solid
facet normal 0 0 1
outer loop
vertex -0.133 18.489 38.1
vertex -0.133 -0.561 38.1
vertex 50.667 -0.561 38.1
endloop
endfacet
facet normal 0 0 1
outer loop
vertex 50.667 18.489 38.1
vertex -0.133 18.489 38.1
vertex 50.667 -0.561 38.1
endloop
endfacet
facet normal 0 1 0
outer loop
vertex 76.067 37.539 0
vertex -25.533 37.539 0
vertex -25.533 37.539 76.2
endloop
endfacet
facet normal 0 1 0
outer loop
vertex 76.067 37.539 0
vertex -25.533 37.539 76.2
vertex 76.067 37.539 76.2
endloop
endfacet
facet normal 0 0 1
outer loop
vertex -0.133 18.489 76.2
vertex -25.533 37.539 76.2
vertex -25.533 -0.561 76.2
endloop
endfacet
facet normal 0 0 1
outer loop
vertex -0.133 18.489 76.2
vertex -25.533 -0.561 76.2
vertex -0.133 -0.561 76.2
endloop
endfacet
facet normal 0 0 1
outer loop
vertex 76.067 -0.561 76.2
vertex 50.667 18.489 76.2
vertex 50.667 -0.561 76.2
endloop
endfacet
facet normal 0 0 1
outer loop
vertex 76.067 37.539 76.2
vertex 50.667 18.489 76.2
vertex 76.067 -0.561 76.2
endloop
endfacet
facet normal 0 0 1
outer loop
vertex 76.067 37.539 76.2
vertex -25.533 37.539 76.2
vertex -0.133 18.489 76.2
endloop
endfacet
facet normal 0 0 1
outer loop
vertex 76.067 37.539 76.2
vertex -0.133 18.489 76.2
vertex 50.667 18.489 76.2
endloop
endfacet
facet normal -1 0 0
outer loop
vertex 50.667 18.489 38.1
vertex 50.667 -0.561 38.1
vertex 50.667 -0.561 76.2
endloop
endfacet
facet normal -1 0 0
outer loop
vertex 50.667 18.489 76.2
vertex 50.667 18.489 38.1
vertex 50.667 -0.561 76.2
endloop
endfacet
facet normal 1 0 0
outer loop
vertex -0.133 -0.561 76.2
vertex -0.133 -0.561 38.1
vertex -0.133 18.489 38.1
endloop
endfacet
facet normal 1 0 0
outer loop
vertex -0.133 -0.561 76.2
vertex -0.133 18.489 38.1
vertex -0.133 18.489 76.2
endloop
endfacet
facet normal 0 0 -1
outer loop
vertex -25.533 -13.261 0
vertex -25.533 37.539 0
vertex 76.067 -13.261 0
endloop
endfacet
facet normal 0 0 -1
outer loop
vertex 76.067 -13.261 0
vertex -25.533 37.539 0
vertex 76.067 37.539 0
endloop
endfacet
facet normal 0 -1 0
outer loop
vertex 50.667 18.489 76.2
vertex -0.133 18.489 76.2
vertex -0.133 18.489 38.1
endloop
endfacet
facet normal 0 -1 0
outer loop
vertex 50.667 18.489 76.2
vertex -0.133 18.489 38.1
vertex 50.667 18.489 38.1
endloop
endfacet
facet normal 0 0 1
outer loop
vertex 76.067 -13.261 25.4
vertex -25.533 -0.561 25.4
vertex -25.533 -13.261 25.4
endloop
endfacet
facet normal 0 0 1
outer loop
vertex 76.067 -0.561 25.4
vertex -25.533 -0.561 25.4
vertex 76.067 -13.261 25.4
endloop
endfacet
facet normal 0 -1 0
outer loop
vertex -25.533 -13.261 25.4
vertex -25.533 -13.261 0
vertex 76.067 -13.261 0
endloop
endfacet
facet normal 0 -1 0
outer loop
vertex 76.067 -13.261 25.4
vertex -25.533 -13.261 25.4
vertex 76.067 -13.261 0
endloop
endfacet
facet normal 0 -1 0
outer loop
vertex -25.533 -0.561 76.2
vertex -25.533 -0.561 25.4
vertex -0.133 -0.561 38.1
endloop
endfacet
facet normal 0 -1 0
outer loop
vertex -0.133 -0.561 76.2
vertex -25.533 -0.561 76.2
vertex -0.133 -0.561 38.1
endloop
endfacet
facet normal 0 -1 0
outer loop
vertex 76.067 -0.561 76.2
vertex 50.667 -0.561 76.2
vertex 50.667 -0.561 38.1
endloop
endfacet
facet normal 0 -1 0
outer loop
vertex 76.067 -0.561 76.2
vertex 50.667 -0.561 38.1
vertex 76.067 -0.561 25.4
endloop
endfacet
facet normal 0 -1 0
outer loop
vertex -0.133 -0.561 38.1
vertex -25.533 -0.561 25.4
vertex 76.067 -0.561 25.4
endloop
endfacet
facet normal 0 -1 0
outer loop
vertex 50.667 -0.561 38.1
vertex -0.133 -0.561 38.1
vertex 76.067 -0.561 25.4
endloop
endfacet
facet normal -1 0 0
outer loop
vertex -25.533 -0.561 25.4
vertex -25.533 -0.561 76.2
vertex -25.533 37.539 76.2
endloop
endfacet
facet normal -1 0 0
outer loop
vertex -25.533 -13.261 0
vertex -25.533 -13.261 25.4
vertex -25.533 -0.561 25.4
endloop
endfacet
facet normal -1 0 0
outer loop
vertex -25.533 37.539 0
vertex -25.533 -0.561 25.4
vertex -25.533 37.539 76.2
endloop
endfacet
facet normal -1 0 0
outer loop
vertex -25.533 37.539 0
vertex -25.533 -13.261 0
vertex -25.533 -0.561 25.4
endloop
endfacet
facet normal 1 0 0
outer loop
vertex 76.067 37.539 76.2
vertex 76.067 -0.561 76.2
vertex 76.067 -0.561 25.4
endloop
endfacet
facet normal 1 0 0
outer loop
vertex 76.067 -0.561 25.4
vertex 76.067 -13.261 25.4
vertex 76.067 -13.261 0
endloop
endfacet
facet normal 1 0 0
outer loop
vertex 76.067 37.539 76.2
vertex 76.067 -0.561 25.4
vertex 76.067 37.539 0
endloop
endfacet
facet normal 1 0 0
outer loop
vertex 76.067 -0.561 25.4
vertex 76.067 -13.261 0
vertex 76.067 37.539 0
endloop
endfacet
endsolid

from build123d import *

# Parameters (mm, degrees)
F0_W     = 101.6
F0_H     = 50.8
F1_DEPTH = 25.4
F2_W     = 101.6
F2_H     = 38.1
F3_DEPTH = 50.8
F4_W     = 50.8
F4_H     = 38.1
F5_DEPTH = 19.05


with BuildPart() as f1:
    # F0 (on Top) → F1 (new body)
    with BuildSketch(Plane.XY):
        with Locations((25.266851, 12.138548)):
            Rectangle(F0_W, F0_H)
    extrude(amount=F1_DEPTH)

    # F2 (on face) → F3 (join)
    with BuildSketch(Plane.XY.offset(25.4)):
        with Locations((25.266851, 18.488548)):
            Rectangle(F2_W, F2_H)
    extrude(amount=F3_DEPTH)

    # F4 (on face) → F5 (cut)
    with BuildSketch(Plane.XZ.offset(0.561452)):
        with Locations((25.266851, 57.15)):
            Rectangle(F4_W, F4_H)
    extrude(amount=-F5_DEPTH, mode=Mode.SUBTRACT)


solid = f1.part
